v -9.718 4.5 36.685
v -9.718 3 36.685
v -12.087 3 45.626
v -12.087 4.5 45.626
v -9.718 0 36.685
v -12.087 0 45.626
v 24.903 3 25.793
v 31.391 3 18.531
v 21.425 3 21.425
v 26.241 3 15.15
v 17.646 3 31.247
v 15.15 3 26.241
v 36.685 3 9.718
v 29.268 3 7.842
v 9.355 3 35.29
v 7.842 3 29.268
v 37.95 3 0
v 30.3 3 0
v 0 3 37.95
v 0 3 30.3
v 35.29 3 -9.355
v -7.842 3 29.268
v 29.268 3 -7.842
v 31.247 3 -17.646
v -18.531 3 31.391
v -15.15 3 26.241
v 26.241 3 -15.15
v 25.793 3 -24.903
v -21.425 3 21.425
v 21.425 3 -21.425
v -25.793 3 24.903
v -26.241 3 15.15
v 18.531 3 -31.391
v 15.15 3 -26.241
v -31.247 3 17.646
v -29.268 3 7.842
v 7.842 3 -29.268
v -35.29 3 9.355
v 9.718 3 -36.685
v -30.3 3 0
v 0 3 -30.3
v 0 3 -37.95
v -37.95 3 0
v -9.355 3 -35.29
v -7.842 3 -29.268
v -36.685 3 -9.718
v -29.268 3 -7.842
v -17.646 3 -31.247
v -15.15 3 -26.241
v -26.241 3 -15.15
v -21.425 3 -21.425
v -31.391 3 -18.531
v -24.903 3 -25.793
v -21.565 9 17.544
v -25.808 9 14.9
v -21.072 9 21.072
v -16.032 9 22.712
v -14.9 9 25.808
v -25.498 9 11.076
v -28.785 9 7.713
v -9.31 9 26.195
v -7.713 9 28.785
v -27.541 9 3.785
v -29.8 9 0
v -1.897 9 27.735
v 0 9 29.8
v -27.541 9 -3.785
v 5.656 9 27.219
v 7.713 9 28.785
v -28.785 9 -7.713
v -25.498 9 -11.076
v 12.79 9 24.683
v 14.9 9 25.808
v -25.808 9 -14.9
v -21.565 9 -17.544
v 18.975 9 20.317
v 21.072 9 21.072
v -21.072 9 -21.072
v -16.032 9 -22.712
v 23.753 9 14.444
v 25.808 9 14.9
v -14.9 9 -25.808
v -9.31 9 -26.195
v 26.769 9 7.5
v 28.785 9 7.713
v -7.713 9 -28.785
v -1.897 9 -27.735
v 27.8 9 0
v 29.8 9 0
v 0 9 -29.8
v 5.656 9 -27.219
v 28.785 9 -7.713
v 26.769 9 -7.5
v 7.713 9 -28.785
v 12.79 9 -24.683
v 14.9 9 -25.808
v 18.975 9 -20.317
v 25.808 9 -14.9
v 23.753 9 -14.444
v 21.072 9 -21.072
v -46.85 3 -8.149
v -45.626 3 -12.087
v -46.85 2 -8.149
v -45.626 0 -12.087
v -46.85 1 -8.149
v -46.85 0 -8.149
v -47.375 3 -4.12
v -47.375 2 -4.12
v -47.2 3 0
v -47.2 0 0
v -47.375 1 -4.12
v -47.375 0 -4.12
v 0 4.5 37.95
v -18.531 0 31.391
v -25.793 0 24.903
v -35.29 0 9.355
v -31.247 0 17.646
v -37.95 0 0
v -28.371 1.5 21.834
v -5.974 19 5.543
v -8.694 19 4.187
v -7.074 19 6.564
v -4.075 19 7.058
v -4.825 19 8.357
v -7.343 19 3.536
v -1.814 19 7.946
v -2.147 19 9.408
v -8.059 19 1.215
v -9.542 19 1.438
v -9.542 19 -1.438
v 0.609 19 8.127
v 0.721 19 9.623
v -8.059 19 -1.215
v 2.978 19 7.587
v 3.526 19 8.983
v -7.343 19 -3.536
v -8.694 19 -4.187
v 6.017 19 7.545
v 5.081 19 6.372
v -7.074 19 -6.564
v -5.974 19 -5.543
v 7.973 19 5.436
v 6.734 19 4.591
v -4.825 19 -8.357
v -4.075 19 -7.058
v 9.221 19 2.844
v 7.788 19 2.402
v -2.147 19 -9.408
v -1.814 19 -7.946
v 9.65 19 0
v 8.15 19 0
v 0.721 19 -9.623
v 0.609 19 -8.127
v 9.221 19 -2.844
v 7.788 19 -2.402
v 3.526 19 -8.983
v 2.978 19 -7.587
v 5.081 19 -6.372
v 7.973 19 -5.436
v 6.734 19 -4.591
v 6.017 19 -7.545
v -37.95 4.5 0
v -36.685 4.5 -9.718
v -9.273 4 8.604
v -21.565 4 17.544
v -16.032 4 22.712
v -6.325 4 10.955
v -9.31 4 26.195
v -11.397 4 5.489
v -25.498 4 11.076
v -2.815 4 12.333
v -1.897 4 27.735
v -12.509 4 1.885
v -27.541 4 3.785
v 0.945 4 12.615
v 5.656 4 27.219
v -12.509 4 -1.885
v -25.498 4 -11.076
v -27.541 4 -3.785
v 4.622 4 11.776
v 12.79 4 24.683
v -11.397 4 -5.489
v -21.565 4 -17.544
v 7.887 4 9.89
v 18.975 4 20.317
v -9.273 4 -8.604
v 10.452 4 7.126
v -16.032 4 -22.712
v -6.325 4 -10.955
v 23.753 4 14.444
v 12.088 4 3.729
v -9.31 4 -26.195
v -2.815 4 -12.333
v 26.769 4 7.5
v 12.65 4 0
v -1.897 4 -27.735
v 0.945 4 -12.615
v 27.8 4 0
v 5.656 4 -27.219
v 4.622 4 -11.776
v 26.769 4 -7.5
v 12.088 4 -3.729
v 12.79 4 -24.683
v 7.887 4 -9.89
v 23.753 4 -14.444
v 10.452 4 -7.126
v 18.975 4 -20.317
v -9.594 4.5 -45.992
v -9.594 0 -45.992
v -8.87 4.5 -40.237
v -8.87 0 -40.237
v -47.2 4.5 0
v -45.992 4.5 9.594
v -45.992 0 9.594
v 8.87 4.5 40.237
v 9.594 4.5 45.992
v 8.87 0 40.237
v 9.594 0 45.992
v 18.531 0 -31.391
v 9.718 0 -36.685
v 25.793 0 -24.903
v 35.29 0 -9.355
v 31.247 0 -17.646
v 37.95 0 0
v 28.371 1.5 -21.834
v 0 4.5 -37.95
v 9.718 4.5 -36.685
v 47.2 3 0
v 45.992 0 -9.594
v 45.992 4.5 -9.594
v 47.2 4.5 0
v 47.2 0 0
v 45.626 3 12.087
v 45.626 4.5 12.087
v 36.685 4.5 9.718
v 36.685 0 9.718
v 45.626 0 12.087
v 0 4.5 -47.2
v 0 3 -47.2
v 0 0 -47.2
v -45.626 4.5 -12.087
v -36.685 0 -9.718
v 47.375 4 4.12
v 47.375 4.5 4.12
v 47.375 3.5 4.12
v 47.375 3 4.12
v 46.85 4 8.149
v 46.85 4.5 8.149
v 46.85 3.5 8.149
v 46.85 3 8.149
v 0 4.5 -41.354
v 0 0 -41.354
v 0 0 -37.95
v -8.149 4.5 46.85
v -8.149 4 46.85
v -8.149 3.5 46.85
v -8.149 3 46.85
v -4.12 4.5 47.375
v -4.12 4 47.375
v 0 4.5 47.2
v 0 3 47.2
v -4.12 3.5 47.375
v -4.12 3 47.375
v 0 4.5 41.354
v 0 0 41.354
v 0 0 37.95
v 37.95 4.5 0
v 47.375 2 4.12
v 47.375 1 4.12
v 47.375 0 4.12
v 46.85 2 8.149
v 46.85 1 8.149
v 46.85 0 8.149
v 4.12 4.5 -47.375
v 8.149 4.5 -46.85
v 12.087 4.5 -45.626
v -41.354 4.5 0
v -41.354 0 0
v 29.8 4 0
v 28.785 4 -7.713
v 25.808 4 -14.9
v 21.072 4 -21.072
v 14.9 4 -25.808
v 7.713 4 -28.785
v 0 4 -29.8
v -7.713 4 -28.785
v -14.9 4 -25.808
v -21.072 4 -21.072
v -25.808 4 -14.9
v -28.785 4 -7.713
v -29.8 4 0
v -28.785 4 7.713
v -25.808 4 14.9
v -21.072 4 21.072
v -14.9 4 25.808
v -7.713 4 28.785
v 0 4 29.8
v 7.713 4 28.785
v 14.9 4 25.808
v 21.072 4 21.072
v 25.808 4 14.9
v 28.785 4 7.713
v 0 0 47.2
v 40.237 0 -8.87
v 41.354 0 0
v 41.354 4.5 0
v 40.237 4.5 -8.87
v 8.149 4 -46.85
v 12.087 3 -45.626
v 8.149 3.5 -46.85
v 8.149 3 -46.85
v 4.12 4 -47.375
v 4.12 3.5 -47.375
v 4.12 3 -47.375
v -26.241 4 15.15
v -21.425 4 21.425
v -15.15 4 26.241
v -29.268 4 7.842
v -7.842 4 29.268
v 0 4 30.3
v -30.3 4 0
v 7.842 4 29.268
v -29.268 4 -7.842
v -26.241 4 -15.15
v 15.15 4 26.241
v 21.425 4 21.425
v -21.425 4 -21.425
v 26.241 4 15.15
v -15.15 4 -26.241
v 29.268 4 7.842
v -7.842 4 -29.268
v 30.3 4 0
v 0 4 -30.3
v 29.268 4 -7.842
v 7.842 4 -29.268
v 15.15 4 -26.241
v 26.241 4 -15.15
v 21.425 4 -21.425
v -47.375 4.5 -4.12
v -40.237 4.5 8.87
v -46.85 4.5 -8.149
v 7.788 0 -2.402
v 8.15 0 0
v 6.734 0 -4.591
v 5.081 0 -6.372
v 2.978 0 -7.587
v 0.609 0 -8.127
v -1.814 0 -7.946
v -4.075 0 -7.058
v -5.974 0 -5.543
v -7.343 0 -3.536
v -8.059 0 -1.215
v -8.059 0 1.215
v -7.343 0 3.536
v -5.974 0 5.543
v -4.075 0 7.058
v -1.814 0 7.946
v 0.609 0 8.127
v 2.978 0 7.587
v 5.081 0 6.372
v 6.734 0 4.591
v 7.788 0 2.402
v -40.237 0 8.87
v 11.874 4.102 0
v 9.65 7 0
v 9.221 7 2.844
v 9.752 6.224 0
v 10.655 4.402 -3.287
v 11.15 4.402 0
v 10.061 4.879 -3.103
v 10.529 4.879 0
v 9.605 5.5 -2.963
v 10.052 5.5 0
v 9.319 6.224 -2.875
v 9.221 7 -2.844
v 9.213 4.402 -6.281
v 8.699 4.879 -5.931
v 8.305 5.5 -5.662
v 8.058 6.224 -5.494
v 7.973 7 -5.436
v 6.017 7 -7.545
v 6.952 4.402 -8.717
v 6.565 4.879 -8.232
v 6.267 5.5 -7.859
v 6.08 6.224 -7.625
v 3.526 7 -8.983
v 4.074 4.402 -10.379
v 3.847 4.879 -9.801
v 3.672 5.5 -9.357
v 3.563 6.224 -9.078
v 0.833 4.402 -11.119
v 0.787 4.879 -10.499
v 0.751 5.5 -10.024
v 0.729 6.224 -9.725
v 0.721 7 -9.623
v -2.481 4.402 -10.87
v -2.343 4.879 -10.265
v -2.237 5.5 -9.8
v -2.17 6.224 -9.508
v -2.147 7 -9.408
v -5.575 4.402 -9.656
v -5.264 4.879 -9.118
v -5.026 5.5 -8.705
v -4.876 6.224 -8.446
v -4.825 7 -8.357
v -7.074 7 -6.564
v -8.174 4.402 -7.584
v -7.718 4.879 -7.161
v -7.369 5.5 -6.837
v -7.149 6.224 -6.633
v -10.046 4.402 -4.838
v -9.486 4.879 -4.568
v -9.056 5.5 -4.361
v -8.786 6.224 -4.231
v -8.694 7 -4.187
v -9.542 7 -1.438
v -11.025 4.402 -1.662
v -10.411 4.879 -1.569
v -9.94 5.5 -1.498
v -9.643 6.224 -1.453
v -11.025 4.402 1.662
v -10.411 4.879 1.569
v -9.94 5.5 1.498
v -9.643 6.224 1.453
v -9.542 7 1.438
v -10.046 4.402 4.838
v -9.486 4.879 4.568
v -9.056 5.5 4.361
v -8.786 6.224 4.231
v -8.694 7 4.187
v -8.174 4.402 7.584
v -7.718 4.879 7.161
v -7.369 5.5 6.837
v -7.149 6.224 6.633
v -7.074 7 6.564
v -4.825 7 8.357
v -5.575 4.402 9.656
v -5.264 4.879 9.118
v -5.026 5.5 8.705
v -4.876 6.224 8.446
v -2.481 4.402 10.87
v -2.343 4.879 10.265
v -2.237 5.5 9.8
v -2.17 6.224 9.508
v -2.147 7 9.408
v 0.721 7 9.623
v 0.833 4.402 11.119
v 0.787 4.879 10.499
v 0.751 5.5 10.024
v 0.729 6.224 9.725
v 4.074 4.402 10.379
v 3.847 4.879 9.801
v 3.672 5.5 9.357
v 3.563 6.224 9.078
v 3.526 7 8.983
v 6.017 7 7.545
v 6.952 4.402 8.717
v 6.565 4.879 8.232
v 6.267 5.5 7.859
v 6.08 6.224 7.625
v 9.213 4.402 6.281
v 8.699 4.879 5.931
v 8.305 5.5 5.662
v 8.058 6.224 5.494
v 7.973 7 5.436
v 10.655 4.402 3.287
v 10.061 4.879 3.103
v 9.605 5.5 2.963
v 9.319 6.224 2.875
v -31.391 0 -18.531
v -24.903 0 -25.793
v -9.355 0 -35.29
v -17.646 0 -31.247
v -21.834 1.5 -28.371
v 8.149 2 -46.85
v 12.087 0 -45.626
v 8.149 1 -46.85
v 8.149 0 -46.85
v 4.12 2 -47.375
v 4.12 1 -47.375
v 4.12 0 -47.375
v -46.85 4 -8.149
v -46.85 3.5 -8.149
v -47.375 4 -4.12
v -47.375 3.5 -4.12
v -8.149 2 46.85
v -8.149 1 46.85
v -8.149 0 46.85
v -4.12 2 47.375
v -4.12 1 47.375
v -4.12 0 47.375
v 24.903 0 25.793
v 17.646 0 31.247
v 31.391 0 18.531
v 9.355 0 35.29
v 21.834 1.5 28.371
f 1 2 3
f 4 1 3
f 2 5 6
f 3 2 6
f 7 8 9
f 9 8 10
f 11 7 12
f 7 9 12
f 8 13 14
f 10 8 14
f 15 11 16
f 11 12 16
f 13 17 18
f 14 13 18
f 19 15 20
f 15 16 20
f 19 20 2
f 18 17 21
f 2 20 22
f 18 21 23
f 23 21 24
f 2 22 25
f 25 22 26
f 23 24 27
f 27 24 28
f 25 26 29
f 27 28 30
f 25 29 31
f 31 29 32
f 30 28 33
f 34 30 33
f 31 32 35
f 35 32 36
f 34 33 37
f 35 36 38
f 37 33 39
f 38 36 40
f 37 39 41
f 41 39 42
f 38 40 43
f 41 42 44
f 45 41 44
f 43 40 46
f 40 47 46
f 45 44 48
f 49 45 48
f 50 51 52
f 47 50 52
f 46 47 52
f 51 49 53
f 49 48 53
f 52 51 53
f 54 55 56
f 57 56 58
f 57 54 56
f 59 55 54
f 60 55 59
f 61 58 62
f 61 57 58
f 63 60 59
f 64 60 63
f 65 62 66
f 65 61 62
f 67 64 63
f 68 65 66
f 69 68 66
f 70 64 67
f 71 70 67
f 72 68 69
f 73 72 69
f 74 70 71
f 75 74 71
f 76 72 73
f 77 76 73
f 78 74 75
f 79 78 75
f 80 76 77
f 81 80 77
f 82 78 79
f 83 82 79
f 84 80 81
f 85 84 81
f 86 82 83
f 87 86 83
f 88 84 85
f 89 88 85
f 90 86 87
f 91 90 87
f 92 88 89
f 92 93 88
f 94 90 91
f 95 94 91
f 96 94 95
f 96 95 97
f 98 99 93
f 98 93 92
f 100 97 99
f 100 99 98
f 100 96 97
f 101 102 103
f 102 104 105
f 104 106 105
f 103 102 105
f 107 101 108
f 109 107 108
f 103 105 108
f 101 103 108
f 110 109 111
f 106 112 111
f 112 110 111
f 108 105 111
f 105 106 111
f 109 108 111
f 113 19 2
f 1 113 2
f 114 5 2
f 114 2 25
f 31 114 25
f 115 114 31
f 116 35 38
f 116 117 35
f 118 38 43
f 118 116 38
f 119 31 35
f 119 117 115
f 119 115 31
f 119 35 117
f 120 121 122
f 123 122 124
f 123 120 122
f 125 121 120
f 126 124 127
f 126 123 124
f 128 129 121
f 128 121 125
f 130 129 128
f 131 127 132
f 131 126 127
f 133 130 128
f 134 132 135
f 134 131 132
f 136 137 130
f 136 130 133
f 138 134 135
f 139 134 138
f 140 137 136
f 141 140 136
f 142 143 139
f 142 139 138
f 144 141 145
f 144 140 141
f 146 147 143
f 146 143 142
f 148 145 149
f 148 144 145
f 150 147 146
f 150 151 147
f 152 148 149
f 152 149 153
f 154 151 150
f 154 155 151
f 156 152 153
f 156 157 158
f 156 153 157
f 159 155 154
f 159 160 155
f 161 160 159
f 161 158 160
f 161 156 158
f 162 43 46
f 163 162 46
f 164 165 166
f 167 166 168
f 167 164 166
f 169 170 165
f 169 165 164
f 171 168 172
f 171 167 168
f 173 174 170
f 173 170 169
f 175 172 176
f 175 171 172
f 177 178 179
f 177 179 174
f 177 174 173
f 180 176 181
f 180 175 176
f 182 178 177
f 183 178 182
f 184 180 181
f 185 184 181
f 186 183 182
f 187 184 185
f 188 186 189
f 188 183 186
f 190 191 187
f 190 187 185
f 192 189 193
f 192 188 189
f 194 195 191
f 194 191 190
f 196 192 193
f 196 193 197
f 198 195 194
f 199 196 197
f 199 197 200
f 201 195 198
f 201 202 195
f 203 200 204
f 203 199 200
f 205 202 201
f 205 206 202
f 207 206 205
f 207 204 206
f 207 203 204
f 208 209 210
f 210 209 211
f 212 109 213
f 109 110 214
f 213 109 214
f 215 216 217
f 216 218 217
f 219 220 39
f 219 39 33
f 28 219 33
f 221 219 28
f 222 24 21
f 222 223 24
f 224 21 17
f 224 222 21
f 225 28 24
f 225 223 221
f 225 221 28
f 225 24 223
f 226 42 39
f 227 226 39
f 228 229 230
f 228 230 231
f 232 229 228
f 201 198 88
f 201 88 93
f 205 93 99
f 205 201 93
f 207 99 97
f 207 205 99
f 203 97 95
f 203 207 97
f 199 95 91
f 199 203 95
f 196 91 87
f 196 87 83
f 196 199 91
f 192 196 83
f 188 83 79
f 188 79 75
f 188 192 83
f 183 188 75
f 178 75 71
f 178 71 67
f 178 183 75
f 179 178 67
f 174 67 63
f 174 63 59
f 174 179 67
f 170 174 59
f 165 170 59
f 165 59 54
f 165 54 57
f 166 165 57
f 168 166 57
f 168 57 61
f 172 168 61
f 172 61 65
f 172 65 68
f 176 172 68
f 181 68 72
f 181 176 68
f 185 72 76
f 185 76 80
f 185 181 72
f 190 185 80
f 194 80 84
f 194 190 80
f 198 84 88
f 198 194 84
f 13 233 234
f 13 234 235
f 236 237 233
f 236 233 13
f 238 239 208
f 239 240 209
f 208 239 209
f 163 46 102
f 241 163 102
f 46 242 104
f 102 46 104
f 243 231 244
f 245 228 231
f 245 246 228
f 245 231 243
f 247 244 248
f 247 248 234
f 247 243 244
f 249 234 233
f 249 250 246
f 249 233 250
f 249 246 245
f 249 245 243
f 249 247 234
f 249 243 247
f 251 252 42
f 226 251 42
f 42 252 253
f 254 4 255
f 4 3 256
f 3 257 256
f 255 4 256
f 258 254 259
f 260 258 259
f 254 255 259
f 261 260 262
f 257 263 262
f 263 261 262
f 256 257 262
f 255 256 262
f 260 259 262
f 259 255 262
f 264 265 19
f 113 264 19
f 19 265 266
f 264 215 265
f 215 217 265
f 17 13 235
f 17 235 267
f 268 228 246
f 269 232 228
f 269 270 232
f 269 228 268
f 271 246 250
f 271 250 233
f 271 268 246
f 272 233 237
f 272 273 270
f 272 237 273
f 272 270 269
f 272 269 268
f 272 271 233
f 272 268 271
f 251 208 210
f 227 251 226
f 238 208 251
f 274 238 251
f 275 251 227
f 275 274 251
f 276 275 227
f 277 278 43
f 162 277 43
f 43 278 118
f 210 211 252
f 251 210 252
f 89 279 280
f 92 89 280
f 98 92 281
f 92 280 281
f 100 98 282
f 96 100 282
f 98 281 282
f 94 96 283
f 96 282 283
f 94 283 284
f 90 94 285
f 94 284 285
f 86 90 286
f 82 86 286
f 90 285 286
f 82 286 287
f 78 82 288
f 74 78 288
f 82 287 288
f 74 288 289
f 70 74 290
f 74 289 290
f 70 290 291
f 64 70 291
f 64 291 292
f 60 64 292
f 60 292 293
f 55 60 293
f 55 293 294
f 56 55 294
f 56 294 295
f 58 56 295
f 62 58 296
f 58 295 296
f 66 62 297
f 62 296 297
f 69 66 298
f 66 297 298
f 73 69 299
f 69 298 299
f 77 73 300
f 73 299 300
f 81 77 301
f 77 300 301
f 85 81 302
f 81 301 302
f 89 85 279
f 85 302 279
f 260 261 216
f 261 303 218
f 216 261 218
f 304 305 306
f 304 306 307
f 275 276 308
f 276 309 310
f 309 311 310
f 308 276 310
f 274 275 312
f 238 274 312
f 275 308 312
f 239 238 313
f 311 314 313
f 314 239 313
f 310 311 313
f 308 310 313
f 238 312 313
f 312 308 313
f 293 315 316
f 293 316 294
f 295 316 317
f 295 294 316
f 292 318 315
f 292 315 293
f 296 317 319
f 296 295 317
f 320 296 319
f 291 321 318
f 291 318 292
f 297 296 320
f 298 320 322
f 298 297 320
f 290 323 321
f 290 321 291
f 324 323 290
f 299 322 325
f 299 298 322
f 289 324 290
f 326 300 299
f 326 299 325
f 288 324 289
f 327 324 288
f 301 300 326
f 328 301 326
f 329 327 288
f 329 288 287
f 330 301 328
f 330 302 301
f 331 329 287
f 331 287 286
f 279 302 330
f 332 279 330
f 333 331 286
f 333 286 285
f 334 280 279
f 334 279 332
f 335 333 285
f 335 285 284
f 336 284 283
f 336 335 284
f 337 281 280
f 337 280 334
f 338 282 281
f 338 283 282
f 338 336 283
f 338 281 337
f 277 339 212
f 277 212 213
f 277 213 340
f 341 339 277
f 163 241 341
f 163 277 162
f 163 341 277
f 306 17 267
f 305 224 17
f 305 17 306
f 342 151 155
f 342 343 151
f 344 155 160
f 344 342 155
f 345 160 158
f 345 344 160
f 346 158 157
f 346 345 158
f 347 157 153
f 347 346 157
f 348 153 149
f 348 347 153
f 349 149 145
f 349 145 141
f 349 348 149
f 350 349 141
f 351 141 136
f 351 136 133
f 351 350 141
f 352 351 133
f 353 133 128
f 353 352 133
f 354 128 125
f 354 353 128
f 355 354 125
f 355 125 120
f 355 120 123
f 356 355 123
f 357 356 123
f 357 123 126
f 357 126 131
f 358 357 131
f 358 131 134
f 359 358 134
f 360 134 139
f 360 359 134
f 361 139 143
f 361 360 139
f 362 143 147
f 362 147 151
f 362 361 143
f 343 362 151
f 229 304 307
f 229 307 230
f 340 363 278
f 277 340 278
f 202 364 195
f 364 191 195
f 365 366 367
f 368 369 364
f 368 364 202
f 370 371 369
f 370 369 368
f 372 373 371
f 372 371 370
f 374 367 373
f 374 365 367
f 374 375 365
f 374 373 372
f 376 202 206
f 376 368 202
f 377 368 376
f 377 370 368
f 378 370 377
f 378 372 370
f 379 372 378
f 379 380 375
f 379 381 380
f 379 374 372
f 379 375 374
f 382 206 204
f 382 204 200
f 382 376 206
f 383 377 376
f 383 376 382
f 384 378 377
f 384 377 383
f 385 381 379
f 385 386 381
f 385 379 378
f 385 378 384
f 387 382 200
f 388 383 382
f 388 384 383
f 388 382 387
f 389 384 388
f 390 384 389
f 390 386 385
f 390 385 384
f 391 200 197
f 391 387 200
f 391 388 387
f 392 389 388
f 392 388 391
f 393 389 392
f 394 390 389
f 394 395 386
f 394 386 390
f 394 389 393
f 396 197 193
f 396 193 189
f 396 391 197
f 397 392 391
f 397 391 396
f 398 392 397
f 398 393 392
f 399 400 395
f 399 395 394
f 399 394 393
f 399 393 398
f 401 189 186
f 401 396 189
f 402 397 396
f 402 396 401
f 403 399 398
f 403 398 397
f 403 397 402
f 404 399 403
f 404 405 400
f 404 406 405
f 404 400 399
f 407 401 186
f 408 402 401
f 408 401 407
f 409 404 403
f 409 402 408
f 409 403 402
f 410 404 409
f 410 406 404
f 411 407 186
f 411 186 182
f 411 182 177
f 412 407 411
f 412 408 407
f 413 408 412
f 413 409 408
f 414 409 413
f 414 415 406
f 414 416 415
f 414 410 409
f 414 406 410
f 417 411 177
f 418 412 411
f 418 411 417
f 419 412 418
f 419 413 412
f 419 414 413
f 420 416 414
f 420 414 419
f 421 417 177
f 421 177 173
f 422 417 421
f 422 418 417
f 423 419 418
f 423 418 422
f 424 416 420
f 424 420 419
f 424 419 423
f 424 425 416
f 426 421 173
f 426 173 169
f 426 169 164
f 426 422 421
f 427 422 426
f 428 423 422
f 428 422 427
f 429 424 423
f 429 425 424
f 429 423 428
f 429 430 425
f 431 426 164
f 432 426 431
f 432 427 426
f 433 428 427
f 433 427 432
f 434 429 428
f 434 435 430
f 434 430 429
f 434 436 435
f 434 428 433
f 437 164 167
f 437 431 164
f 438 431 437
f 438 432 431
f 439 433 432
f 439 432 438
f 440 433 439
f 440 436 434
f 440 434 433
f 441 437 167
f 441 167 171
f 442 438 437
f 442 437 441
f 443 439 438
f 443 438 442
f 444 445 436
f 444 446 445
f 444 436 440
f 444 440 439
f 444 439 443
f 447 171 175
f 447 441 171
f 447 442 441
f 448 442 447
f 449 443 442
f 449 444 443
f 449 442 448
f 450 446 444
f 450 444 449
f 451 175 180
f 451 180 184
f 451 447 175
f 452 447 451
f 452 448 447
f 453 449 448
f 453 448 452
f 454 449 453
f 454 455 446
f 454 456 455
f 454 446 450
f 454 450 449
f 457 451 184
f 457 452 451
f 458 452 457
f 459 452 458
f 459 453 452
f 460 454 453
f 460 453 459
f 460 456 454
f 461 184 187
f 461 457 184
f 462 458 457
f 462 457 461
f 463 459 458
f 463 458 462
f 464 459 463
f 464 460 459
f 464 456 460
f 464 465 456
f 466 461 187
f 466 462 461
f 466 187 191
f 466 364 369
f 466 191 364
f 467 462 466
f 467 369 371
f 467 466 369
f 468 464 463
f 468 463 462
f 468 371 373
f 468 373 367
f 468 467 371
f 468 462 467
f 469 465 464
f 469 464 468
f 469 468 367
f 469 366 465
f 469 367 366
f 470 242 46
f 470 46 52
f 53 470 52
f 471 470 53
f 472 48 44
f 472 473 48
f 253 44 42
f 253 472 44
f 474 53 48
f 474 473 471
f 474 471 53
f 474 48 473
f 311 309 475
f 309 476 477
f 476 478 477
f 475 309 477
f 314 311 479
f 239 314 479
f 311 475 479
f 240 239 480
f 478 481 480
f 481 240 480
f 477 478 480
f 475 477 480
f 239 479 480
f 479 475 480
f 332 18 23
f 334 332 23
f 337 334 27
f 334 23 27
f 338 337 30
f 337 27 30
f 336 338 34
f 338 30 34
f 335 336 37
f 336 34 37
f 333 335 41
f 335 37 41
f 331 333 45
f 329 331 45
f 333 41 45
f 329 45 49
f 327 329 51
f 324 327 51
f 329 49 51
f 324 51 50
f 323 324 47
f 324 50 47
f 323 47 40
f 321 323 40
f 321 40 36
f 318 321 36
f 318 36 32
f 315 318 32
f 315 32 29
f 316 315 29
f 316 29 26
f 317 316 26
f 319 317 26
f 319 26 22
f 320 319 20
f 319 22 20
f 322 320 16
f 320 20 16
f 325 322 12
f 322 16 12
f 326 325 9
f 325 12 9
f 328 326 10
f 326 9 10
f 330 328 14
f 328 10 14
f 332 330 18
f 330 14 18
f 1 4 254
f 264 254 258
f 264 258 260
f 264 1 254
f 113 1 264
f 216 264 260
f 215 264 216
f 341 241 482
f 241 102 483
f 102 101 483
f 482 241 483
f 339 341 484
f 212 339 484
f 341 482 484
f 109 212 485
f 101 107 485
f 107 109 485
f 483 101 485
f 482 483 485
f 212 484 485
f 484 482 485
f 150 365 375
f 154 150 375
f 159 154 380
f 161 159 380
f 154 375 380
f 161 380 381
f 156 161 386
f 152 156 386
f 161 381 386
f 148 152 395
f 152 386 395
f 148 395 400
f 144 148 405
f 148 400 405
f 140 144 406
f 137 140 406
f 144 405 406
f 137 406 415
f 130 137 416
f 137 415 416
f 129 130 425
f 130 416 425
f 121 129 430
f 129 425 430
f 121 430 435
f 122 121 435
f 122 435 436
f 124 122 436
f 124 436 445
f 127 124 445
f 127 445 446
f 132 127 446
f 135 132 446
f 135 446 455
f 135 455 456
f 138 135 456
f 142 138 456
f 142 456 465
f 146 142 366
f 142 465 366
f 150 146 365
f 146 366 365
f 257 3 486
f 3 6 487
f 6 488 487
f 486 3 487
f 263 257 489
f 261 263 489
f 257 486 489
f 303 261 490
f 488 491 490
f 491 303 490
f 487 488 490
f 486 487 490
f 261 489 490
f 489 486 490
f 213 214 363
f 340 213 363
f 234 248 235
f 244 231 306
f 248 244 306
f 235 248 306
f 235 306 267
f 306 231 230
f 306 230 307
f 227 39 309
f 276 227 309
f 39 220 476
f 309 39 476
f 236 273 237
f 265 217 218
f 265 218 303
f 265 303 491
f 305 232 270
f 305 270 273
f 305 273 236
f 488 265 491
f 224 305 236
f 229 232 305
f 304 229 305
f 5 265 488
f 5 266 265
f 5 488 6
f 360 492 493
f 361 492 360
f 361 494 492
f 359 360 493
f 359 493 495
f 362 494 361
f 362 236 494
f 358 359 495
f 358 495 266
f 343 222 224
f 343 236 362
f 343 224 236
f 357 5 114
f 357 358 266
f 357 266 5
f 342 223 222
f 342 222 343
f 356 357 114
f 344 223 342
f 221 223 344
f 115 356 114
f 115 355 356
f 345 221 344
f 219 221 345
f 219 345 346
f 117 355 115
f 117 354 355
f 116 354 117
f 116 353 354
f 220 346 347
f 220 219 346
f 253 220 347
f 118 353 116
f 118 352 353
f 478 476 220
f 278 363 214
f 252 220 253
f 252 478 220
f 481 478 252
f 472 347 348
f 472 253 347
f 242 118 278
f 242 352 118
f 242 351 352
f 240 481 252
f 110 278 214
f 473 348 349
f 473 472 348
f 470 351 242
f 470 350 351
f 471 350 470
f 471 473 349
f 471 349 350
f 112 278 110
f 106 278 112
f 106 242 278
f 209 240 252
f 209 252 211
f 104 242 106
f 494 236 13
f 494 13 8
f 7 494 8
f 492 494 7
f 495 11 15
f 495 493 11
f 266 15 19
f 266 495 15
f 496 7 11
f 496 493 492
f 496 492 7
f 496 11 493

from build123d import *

# Parameters (mm, degrees)
BOSS_EXTRUDE1_DEPTH = 3
BOSS_EXTRUDE2_START = 3
BOSS_EXTRUDE2_DEPTH = 1.5
SKETCH2_R           = 30.3
SKETCH2_R_2         = 29.8
SKETCH2_R_3         = 27.8
BOSS_EXTRUDE3_DEPTH = 1
SKETCH3_R           = 29.8
SKETCH3_R_2         = 27.8
BOSS_EXTRUDE4_DEPTH = 5
SKETCH4_R           = 9.65
SKETCH4_R_2         = 8.15
BOSS_EXTRUDE5_DEPTH = 15
FILLET1_R           = 3
SKETCH5_R           = 8.15
CUT_EXTRUDE1_DEPTH  = 19


with BuildPart() as part:
    # Sketch1 → Boss-Extrude1 (new body)
    with BuildSketch(Plane(origin=(0, 0, 0), x_dir=(1, 0, 0), z_dir=(0, 1, 0))):
        with BuildLine():
            add(Edge.make_bspline(
                [(-9.71796746, -36.684650856), (-32.908122366, -25.325665089), (-37.95, 0)],
                knots=[0, 0, 0, 1, 1, 1], degree=2))
            Line((-37.95, 0), (-36.684650856, 9.71796746))
            add(Edge.make_bspline(
                [(-36.684650856, 9.71796746), (-25.325665089, 32.908122366), (0, 37.95)],
                knots=[0, 0, 0, 1, 1, 1], degree=2))
            Line((0, 37.95), (9.71796746, 36.684650856))
            add(Edge.make_bspline(
                [(9.71796746, 36.684650856), (32.908122366, 25.325665089), (37.95, 0)],
                knots=[0, 0, 0, 1, 1, 1], degree=2))
            Line((37.95, 0), (36.684650856, -9.71796746))
            add(Edge.make_bspline(
                [(36.684650856, -9.71796746), (25.325665089, -32.908122366), (0, -37.95)],
                knots=[0, 0, 0, 1, 1, 1], degree=2))
            Line((0, -37.95), (-9.71796746, -36.684650856))
        make_face()
        with BuildLine():
            Line((-36.684650856, 9.71796746), (-45.626232422, 12.086642005))
            add(Edge.make_bspline(
                [(-45.626232422, 12.086642005), (-47.200054133, 8.194360075), (-47.724535059, 4.165503049), (-47.2, 0)],
                knots=[0, 0, 0, 0, 1, 1, 1, 1], degree=3))
            Line((-47.2, 0), (-45.991859888, -9.594232511))
            Line((-45.991859888, -9.594232511), (-40.237304711, -8.869598317))
            Line((-40.237304711, -8.869598317), (-41.354196291, 0))
            Line((-41.354196291, 0), (-37.95, 0))
            Line((-37.95, 0), (-36.684650856, 9.71796746))
        make_face()
        with BuildLine():
            Line((-9.71796746, -36.684650856), (-12.086642005, -45.626232422))
            add(Edge.make_bspline(
                [(-12.086642005, -45.626232422), (-8.194360105, -47.200054362), (-4.165503019, -47.72453483), (0, -47.2)],
                knots=[0, 0, 0, 0, 1, 1, 1, 1], degree=3))
            Line((0, -47.2), (9.594232575, -45.991860399))
            Line((9.594232575, -45.991860399), (8.869598688, -40.237305183))
            Line((8.869598688, -40.237305183), (0, -41.35419633))
            Line((0, -41.35419633), (0, -37.95))
            Line((0, -37.95), (-9.71796746, -36.684650856))
        make_face()
        with BuildLine():
            add(Edge.make_bspline(
                [(47.2, 0), (47.724535051, -4.165503048), (47.200054142, -8.194360076), (45.626232422, -12.086642005)],
                knots=[0, 0, 0, 0, 1, 1, 1, 1], degree=3))
            Line((45.626232422, -12.086642005), (36.684650856, -9.71796746))
            Line((36.684650856, -9.71796746), (37.95, 0))
            Line((37.95, 0), (41.354196292, 0))
            Line((41.354196292, 0), (40.237304729, 8.869598332))
            Line((40.237304729, 8.869598332), (45.991859908, 9.594232513))
            Line((45.991859908, 9.594232513), (47.2, 0))
        make_face()
        with BuildLine():
            Line((9.71796746, 36.684650856), (12.086642005, 45.626232422))
            add(Edge.make_bspline(
                [(12.086642005, 45.626232422), (8.194360088, 47.200054234), (4.165503036, 47.724534958), (0, 47.2)],
                knots=[0, 0, 0, 0, 1, 1, 1, 1], degree=3))
            Line((0, 47.2), (-9.594232539, 45.991860113))
            Line((-9.594232539, 45.991860113), (-8.869598481, 40.237304919))
            Line((-8.869598481, 40.237304919), (0, 41.354196308))
            Line((0, 41.354196308), (0, 37.95))
            Line((0, 37.95), (9.71796746, 36.684650856))
        make_face()
    extrude(amount=BOSS_EXTRUDE1_DEPTH)

    # Sketch1<3> → Boss-Extrude2 (add)
    with BuildSketch(Plane(origin=(0, 0, 0), x_dir=(1, 0, 0), z_dir=(0, 1, 0)).offset(BOSS_EXTRUDE2_START)):
        with BuildLine():
            Line((-9.71796746, -36.684650856), (-12.086642005, -45.626232422))
            add(Edge.make_bspline(
                [(-12.086642005, -45.626232422), (-8.194360105, -47.200054362), (-4.165503019, -47.72453483), (0, -47.2)],
                knots=[0, 0, 0, 0, 1, 1, 1, 1], degree=3))
            Line((0, -47.2), (9.594232575, -45.991860399))
            Line((9.594232575, -45.991860399), (8.869598688, -40.237305183))
            Line((8.869598688, -40.237305183), (0, -41.35419633))
            Line((0, -41.35419633), (0, -37.95))
            Line((0, -37.95), (-9.71796746, -36.684650856))
        make_face()
        with BuildLine():
            add(Edge.make_bspline(
                [(47.2, 0), (47.724535051, -4.165503048), (47.200054142, -8.194360076), (45.626232422, -12.086642005)],
                knots=[0, 0, 0, 0, 1, 1, 1, 1], degree=3))
            Line((45.626232422, -12.086642005), (36.684650856, -9.71796746))
            Line((36.684650856, -9.71796746), (37.95, 0))
            Line((37.95, 0), (41.354196292, 0))
            Line((41.354196292, 0), (40.237304729, 8.869598332))
            Line((40.237304729, 8.869598332), (45.991859908, 9.594232513))
            Line((45.991859908, 9.594232513), (47.2, 0))
        make_face()
        with BuildLine():
            Line((9.71796746, 36.684650856), (12.086642005, 45.626232422))
            add(Edge.make_bspline(
                [(12.086642005, 45.626232422), (8.194360088, 47.200054234), (4.165503036, 47.724534958), (0, 47.2)],
                knots=[0, 0, 0, 0, 1, 1, 1, 1], degree=3))
            Line((0, 47.2), (-9.594232539, 45.991860113))
            Line((-9.594232539, 45.991860113), (-8.869598481, 40.237304919))
            Line((-8.869598481, 40.237304919), (0, 41.354196308))
            Line((0, 41.354196308), (0, 37.95))
            Line((0, 37.95), (9.71796746, 36.684650856))
        make_face()
        with BuildLine():
            Line((-36.684650856, 9.71796746), (-45.626232422, 12.086642005))
            add(Edge.make_bspline(
                [(-45.626232422, 12.086642005), (-47.200054133, 8.194360075), (-47.724535059, 4.165503049), (-47.2, 0)],
                knots=[0, 0, 0, 0, 1, 1, 1, 1], degree=3))
            Line((-47.2, 0), (-45.991859888, -9.594232511))
            Line((-45.991859888, -9.594232511), (-40.237304711, -8.869598317))
            Line((-40.237304711, -8.869598317), (-41.354196291, 0))
            Line((-41.354196291, 0), (-37.95, 0))
            Line((-37.95, 0), (-36.684650856, 9.71796746))
        make_face()
    extrude(amount=BOSS_EXTRUDE2_DEPTH)

    # Sketch2 → Boss-Extrude3 (add)
    with BuildSketch(Plane(origin=(0, 3, 0), x_dir=(1, 0, 0), z_dir=(0, 1, 0))):
        Circle(SKETCH2_R)
        Circle(SKETCH2_R_2, mode=Mode.SUBTRACT)
        Circle(SKETCH2_R_2)
        Circle(SKETCH2_R_3, mode=Mode.SUBTRACT)
        Circle(SKETCH2_R_3)
    extrude(amount=BOSS_EXTRUDE3_DEPTH)

    # Sketch3 → Boss-Extrude4 (add)
    with BuildSketch(Plane(origin=(0, 4, 0), x_dir=(1, 0, 0), z_dir=(0, 1, 0))):
        Circle(SKETCH3_R)
        Circle(SKETCH3_R_2, mode=Mode.SUBTRACT)
    extrude(amount=BOSS_EXTRUDE4_DEPTH)

    # Sketch4 → Boss-Extrude5 (add)
    with BuildSketch(Plane(origin=(0, 4, 0), x_dir=(1, 0, 0), z_dir=(0, 1, 0))):
        Circle(SKETCH4_R)
        Circle(SKETCH4_R_2, mode=Mode.SUBTRACT)
    extrude(amount=BOSS_EXTRUDE5_DEPTH)

    # Fillet1
    fillet1_edges = [part.edges().sort_by_distance(p)[0] for p in [
        (-9.65, 4, 0),
    ]]
    fillet(fillet1_edges, radius=FILLET1_R)

    # Sketch5 → Cut-Extrude1 (cut)
    with BuildSketch(Plane.XZ):
        Circle(SKETCH5_R)
    extrude(amount=-CUT_EXTRUDE1_DEPTH, mode=Mode.SUBTRACT)


solid = part.part
